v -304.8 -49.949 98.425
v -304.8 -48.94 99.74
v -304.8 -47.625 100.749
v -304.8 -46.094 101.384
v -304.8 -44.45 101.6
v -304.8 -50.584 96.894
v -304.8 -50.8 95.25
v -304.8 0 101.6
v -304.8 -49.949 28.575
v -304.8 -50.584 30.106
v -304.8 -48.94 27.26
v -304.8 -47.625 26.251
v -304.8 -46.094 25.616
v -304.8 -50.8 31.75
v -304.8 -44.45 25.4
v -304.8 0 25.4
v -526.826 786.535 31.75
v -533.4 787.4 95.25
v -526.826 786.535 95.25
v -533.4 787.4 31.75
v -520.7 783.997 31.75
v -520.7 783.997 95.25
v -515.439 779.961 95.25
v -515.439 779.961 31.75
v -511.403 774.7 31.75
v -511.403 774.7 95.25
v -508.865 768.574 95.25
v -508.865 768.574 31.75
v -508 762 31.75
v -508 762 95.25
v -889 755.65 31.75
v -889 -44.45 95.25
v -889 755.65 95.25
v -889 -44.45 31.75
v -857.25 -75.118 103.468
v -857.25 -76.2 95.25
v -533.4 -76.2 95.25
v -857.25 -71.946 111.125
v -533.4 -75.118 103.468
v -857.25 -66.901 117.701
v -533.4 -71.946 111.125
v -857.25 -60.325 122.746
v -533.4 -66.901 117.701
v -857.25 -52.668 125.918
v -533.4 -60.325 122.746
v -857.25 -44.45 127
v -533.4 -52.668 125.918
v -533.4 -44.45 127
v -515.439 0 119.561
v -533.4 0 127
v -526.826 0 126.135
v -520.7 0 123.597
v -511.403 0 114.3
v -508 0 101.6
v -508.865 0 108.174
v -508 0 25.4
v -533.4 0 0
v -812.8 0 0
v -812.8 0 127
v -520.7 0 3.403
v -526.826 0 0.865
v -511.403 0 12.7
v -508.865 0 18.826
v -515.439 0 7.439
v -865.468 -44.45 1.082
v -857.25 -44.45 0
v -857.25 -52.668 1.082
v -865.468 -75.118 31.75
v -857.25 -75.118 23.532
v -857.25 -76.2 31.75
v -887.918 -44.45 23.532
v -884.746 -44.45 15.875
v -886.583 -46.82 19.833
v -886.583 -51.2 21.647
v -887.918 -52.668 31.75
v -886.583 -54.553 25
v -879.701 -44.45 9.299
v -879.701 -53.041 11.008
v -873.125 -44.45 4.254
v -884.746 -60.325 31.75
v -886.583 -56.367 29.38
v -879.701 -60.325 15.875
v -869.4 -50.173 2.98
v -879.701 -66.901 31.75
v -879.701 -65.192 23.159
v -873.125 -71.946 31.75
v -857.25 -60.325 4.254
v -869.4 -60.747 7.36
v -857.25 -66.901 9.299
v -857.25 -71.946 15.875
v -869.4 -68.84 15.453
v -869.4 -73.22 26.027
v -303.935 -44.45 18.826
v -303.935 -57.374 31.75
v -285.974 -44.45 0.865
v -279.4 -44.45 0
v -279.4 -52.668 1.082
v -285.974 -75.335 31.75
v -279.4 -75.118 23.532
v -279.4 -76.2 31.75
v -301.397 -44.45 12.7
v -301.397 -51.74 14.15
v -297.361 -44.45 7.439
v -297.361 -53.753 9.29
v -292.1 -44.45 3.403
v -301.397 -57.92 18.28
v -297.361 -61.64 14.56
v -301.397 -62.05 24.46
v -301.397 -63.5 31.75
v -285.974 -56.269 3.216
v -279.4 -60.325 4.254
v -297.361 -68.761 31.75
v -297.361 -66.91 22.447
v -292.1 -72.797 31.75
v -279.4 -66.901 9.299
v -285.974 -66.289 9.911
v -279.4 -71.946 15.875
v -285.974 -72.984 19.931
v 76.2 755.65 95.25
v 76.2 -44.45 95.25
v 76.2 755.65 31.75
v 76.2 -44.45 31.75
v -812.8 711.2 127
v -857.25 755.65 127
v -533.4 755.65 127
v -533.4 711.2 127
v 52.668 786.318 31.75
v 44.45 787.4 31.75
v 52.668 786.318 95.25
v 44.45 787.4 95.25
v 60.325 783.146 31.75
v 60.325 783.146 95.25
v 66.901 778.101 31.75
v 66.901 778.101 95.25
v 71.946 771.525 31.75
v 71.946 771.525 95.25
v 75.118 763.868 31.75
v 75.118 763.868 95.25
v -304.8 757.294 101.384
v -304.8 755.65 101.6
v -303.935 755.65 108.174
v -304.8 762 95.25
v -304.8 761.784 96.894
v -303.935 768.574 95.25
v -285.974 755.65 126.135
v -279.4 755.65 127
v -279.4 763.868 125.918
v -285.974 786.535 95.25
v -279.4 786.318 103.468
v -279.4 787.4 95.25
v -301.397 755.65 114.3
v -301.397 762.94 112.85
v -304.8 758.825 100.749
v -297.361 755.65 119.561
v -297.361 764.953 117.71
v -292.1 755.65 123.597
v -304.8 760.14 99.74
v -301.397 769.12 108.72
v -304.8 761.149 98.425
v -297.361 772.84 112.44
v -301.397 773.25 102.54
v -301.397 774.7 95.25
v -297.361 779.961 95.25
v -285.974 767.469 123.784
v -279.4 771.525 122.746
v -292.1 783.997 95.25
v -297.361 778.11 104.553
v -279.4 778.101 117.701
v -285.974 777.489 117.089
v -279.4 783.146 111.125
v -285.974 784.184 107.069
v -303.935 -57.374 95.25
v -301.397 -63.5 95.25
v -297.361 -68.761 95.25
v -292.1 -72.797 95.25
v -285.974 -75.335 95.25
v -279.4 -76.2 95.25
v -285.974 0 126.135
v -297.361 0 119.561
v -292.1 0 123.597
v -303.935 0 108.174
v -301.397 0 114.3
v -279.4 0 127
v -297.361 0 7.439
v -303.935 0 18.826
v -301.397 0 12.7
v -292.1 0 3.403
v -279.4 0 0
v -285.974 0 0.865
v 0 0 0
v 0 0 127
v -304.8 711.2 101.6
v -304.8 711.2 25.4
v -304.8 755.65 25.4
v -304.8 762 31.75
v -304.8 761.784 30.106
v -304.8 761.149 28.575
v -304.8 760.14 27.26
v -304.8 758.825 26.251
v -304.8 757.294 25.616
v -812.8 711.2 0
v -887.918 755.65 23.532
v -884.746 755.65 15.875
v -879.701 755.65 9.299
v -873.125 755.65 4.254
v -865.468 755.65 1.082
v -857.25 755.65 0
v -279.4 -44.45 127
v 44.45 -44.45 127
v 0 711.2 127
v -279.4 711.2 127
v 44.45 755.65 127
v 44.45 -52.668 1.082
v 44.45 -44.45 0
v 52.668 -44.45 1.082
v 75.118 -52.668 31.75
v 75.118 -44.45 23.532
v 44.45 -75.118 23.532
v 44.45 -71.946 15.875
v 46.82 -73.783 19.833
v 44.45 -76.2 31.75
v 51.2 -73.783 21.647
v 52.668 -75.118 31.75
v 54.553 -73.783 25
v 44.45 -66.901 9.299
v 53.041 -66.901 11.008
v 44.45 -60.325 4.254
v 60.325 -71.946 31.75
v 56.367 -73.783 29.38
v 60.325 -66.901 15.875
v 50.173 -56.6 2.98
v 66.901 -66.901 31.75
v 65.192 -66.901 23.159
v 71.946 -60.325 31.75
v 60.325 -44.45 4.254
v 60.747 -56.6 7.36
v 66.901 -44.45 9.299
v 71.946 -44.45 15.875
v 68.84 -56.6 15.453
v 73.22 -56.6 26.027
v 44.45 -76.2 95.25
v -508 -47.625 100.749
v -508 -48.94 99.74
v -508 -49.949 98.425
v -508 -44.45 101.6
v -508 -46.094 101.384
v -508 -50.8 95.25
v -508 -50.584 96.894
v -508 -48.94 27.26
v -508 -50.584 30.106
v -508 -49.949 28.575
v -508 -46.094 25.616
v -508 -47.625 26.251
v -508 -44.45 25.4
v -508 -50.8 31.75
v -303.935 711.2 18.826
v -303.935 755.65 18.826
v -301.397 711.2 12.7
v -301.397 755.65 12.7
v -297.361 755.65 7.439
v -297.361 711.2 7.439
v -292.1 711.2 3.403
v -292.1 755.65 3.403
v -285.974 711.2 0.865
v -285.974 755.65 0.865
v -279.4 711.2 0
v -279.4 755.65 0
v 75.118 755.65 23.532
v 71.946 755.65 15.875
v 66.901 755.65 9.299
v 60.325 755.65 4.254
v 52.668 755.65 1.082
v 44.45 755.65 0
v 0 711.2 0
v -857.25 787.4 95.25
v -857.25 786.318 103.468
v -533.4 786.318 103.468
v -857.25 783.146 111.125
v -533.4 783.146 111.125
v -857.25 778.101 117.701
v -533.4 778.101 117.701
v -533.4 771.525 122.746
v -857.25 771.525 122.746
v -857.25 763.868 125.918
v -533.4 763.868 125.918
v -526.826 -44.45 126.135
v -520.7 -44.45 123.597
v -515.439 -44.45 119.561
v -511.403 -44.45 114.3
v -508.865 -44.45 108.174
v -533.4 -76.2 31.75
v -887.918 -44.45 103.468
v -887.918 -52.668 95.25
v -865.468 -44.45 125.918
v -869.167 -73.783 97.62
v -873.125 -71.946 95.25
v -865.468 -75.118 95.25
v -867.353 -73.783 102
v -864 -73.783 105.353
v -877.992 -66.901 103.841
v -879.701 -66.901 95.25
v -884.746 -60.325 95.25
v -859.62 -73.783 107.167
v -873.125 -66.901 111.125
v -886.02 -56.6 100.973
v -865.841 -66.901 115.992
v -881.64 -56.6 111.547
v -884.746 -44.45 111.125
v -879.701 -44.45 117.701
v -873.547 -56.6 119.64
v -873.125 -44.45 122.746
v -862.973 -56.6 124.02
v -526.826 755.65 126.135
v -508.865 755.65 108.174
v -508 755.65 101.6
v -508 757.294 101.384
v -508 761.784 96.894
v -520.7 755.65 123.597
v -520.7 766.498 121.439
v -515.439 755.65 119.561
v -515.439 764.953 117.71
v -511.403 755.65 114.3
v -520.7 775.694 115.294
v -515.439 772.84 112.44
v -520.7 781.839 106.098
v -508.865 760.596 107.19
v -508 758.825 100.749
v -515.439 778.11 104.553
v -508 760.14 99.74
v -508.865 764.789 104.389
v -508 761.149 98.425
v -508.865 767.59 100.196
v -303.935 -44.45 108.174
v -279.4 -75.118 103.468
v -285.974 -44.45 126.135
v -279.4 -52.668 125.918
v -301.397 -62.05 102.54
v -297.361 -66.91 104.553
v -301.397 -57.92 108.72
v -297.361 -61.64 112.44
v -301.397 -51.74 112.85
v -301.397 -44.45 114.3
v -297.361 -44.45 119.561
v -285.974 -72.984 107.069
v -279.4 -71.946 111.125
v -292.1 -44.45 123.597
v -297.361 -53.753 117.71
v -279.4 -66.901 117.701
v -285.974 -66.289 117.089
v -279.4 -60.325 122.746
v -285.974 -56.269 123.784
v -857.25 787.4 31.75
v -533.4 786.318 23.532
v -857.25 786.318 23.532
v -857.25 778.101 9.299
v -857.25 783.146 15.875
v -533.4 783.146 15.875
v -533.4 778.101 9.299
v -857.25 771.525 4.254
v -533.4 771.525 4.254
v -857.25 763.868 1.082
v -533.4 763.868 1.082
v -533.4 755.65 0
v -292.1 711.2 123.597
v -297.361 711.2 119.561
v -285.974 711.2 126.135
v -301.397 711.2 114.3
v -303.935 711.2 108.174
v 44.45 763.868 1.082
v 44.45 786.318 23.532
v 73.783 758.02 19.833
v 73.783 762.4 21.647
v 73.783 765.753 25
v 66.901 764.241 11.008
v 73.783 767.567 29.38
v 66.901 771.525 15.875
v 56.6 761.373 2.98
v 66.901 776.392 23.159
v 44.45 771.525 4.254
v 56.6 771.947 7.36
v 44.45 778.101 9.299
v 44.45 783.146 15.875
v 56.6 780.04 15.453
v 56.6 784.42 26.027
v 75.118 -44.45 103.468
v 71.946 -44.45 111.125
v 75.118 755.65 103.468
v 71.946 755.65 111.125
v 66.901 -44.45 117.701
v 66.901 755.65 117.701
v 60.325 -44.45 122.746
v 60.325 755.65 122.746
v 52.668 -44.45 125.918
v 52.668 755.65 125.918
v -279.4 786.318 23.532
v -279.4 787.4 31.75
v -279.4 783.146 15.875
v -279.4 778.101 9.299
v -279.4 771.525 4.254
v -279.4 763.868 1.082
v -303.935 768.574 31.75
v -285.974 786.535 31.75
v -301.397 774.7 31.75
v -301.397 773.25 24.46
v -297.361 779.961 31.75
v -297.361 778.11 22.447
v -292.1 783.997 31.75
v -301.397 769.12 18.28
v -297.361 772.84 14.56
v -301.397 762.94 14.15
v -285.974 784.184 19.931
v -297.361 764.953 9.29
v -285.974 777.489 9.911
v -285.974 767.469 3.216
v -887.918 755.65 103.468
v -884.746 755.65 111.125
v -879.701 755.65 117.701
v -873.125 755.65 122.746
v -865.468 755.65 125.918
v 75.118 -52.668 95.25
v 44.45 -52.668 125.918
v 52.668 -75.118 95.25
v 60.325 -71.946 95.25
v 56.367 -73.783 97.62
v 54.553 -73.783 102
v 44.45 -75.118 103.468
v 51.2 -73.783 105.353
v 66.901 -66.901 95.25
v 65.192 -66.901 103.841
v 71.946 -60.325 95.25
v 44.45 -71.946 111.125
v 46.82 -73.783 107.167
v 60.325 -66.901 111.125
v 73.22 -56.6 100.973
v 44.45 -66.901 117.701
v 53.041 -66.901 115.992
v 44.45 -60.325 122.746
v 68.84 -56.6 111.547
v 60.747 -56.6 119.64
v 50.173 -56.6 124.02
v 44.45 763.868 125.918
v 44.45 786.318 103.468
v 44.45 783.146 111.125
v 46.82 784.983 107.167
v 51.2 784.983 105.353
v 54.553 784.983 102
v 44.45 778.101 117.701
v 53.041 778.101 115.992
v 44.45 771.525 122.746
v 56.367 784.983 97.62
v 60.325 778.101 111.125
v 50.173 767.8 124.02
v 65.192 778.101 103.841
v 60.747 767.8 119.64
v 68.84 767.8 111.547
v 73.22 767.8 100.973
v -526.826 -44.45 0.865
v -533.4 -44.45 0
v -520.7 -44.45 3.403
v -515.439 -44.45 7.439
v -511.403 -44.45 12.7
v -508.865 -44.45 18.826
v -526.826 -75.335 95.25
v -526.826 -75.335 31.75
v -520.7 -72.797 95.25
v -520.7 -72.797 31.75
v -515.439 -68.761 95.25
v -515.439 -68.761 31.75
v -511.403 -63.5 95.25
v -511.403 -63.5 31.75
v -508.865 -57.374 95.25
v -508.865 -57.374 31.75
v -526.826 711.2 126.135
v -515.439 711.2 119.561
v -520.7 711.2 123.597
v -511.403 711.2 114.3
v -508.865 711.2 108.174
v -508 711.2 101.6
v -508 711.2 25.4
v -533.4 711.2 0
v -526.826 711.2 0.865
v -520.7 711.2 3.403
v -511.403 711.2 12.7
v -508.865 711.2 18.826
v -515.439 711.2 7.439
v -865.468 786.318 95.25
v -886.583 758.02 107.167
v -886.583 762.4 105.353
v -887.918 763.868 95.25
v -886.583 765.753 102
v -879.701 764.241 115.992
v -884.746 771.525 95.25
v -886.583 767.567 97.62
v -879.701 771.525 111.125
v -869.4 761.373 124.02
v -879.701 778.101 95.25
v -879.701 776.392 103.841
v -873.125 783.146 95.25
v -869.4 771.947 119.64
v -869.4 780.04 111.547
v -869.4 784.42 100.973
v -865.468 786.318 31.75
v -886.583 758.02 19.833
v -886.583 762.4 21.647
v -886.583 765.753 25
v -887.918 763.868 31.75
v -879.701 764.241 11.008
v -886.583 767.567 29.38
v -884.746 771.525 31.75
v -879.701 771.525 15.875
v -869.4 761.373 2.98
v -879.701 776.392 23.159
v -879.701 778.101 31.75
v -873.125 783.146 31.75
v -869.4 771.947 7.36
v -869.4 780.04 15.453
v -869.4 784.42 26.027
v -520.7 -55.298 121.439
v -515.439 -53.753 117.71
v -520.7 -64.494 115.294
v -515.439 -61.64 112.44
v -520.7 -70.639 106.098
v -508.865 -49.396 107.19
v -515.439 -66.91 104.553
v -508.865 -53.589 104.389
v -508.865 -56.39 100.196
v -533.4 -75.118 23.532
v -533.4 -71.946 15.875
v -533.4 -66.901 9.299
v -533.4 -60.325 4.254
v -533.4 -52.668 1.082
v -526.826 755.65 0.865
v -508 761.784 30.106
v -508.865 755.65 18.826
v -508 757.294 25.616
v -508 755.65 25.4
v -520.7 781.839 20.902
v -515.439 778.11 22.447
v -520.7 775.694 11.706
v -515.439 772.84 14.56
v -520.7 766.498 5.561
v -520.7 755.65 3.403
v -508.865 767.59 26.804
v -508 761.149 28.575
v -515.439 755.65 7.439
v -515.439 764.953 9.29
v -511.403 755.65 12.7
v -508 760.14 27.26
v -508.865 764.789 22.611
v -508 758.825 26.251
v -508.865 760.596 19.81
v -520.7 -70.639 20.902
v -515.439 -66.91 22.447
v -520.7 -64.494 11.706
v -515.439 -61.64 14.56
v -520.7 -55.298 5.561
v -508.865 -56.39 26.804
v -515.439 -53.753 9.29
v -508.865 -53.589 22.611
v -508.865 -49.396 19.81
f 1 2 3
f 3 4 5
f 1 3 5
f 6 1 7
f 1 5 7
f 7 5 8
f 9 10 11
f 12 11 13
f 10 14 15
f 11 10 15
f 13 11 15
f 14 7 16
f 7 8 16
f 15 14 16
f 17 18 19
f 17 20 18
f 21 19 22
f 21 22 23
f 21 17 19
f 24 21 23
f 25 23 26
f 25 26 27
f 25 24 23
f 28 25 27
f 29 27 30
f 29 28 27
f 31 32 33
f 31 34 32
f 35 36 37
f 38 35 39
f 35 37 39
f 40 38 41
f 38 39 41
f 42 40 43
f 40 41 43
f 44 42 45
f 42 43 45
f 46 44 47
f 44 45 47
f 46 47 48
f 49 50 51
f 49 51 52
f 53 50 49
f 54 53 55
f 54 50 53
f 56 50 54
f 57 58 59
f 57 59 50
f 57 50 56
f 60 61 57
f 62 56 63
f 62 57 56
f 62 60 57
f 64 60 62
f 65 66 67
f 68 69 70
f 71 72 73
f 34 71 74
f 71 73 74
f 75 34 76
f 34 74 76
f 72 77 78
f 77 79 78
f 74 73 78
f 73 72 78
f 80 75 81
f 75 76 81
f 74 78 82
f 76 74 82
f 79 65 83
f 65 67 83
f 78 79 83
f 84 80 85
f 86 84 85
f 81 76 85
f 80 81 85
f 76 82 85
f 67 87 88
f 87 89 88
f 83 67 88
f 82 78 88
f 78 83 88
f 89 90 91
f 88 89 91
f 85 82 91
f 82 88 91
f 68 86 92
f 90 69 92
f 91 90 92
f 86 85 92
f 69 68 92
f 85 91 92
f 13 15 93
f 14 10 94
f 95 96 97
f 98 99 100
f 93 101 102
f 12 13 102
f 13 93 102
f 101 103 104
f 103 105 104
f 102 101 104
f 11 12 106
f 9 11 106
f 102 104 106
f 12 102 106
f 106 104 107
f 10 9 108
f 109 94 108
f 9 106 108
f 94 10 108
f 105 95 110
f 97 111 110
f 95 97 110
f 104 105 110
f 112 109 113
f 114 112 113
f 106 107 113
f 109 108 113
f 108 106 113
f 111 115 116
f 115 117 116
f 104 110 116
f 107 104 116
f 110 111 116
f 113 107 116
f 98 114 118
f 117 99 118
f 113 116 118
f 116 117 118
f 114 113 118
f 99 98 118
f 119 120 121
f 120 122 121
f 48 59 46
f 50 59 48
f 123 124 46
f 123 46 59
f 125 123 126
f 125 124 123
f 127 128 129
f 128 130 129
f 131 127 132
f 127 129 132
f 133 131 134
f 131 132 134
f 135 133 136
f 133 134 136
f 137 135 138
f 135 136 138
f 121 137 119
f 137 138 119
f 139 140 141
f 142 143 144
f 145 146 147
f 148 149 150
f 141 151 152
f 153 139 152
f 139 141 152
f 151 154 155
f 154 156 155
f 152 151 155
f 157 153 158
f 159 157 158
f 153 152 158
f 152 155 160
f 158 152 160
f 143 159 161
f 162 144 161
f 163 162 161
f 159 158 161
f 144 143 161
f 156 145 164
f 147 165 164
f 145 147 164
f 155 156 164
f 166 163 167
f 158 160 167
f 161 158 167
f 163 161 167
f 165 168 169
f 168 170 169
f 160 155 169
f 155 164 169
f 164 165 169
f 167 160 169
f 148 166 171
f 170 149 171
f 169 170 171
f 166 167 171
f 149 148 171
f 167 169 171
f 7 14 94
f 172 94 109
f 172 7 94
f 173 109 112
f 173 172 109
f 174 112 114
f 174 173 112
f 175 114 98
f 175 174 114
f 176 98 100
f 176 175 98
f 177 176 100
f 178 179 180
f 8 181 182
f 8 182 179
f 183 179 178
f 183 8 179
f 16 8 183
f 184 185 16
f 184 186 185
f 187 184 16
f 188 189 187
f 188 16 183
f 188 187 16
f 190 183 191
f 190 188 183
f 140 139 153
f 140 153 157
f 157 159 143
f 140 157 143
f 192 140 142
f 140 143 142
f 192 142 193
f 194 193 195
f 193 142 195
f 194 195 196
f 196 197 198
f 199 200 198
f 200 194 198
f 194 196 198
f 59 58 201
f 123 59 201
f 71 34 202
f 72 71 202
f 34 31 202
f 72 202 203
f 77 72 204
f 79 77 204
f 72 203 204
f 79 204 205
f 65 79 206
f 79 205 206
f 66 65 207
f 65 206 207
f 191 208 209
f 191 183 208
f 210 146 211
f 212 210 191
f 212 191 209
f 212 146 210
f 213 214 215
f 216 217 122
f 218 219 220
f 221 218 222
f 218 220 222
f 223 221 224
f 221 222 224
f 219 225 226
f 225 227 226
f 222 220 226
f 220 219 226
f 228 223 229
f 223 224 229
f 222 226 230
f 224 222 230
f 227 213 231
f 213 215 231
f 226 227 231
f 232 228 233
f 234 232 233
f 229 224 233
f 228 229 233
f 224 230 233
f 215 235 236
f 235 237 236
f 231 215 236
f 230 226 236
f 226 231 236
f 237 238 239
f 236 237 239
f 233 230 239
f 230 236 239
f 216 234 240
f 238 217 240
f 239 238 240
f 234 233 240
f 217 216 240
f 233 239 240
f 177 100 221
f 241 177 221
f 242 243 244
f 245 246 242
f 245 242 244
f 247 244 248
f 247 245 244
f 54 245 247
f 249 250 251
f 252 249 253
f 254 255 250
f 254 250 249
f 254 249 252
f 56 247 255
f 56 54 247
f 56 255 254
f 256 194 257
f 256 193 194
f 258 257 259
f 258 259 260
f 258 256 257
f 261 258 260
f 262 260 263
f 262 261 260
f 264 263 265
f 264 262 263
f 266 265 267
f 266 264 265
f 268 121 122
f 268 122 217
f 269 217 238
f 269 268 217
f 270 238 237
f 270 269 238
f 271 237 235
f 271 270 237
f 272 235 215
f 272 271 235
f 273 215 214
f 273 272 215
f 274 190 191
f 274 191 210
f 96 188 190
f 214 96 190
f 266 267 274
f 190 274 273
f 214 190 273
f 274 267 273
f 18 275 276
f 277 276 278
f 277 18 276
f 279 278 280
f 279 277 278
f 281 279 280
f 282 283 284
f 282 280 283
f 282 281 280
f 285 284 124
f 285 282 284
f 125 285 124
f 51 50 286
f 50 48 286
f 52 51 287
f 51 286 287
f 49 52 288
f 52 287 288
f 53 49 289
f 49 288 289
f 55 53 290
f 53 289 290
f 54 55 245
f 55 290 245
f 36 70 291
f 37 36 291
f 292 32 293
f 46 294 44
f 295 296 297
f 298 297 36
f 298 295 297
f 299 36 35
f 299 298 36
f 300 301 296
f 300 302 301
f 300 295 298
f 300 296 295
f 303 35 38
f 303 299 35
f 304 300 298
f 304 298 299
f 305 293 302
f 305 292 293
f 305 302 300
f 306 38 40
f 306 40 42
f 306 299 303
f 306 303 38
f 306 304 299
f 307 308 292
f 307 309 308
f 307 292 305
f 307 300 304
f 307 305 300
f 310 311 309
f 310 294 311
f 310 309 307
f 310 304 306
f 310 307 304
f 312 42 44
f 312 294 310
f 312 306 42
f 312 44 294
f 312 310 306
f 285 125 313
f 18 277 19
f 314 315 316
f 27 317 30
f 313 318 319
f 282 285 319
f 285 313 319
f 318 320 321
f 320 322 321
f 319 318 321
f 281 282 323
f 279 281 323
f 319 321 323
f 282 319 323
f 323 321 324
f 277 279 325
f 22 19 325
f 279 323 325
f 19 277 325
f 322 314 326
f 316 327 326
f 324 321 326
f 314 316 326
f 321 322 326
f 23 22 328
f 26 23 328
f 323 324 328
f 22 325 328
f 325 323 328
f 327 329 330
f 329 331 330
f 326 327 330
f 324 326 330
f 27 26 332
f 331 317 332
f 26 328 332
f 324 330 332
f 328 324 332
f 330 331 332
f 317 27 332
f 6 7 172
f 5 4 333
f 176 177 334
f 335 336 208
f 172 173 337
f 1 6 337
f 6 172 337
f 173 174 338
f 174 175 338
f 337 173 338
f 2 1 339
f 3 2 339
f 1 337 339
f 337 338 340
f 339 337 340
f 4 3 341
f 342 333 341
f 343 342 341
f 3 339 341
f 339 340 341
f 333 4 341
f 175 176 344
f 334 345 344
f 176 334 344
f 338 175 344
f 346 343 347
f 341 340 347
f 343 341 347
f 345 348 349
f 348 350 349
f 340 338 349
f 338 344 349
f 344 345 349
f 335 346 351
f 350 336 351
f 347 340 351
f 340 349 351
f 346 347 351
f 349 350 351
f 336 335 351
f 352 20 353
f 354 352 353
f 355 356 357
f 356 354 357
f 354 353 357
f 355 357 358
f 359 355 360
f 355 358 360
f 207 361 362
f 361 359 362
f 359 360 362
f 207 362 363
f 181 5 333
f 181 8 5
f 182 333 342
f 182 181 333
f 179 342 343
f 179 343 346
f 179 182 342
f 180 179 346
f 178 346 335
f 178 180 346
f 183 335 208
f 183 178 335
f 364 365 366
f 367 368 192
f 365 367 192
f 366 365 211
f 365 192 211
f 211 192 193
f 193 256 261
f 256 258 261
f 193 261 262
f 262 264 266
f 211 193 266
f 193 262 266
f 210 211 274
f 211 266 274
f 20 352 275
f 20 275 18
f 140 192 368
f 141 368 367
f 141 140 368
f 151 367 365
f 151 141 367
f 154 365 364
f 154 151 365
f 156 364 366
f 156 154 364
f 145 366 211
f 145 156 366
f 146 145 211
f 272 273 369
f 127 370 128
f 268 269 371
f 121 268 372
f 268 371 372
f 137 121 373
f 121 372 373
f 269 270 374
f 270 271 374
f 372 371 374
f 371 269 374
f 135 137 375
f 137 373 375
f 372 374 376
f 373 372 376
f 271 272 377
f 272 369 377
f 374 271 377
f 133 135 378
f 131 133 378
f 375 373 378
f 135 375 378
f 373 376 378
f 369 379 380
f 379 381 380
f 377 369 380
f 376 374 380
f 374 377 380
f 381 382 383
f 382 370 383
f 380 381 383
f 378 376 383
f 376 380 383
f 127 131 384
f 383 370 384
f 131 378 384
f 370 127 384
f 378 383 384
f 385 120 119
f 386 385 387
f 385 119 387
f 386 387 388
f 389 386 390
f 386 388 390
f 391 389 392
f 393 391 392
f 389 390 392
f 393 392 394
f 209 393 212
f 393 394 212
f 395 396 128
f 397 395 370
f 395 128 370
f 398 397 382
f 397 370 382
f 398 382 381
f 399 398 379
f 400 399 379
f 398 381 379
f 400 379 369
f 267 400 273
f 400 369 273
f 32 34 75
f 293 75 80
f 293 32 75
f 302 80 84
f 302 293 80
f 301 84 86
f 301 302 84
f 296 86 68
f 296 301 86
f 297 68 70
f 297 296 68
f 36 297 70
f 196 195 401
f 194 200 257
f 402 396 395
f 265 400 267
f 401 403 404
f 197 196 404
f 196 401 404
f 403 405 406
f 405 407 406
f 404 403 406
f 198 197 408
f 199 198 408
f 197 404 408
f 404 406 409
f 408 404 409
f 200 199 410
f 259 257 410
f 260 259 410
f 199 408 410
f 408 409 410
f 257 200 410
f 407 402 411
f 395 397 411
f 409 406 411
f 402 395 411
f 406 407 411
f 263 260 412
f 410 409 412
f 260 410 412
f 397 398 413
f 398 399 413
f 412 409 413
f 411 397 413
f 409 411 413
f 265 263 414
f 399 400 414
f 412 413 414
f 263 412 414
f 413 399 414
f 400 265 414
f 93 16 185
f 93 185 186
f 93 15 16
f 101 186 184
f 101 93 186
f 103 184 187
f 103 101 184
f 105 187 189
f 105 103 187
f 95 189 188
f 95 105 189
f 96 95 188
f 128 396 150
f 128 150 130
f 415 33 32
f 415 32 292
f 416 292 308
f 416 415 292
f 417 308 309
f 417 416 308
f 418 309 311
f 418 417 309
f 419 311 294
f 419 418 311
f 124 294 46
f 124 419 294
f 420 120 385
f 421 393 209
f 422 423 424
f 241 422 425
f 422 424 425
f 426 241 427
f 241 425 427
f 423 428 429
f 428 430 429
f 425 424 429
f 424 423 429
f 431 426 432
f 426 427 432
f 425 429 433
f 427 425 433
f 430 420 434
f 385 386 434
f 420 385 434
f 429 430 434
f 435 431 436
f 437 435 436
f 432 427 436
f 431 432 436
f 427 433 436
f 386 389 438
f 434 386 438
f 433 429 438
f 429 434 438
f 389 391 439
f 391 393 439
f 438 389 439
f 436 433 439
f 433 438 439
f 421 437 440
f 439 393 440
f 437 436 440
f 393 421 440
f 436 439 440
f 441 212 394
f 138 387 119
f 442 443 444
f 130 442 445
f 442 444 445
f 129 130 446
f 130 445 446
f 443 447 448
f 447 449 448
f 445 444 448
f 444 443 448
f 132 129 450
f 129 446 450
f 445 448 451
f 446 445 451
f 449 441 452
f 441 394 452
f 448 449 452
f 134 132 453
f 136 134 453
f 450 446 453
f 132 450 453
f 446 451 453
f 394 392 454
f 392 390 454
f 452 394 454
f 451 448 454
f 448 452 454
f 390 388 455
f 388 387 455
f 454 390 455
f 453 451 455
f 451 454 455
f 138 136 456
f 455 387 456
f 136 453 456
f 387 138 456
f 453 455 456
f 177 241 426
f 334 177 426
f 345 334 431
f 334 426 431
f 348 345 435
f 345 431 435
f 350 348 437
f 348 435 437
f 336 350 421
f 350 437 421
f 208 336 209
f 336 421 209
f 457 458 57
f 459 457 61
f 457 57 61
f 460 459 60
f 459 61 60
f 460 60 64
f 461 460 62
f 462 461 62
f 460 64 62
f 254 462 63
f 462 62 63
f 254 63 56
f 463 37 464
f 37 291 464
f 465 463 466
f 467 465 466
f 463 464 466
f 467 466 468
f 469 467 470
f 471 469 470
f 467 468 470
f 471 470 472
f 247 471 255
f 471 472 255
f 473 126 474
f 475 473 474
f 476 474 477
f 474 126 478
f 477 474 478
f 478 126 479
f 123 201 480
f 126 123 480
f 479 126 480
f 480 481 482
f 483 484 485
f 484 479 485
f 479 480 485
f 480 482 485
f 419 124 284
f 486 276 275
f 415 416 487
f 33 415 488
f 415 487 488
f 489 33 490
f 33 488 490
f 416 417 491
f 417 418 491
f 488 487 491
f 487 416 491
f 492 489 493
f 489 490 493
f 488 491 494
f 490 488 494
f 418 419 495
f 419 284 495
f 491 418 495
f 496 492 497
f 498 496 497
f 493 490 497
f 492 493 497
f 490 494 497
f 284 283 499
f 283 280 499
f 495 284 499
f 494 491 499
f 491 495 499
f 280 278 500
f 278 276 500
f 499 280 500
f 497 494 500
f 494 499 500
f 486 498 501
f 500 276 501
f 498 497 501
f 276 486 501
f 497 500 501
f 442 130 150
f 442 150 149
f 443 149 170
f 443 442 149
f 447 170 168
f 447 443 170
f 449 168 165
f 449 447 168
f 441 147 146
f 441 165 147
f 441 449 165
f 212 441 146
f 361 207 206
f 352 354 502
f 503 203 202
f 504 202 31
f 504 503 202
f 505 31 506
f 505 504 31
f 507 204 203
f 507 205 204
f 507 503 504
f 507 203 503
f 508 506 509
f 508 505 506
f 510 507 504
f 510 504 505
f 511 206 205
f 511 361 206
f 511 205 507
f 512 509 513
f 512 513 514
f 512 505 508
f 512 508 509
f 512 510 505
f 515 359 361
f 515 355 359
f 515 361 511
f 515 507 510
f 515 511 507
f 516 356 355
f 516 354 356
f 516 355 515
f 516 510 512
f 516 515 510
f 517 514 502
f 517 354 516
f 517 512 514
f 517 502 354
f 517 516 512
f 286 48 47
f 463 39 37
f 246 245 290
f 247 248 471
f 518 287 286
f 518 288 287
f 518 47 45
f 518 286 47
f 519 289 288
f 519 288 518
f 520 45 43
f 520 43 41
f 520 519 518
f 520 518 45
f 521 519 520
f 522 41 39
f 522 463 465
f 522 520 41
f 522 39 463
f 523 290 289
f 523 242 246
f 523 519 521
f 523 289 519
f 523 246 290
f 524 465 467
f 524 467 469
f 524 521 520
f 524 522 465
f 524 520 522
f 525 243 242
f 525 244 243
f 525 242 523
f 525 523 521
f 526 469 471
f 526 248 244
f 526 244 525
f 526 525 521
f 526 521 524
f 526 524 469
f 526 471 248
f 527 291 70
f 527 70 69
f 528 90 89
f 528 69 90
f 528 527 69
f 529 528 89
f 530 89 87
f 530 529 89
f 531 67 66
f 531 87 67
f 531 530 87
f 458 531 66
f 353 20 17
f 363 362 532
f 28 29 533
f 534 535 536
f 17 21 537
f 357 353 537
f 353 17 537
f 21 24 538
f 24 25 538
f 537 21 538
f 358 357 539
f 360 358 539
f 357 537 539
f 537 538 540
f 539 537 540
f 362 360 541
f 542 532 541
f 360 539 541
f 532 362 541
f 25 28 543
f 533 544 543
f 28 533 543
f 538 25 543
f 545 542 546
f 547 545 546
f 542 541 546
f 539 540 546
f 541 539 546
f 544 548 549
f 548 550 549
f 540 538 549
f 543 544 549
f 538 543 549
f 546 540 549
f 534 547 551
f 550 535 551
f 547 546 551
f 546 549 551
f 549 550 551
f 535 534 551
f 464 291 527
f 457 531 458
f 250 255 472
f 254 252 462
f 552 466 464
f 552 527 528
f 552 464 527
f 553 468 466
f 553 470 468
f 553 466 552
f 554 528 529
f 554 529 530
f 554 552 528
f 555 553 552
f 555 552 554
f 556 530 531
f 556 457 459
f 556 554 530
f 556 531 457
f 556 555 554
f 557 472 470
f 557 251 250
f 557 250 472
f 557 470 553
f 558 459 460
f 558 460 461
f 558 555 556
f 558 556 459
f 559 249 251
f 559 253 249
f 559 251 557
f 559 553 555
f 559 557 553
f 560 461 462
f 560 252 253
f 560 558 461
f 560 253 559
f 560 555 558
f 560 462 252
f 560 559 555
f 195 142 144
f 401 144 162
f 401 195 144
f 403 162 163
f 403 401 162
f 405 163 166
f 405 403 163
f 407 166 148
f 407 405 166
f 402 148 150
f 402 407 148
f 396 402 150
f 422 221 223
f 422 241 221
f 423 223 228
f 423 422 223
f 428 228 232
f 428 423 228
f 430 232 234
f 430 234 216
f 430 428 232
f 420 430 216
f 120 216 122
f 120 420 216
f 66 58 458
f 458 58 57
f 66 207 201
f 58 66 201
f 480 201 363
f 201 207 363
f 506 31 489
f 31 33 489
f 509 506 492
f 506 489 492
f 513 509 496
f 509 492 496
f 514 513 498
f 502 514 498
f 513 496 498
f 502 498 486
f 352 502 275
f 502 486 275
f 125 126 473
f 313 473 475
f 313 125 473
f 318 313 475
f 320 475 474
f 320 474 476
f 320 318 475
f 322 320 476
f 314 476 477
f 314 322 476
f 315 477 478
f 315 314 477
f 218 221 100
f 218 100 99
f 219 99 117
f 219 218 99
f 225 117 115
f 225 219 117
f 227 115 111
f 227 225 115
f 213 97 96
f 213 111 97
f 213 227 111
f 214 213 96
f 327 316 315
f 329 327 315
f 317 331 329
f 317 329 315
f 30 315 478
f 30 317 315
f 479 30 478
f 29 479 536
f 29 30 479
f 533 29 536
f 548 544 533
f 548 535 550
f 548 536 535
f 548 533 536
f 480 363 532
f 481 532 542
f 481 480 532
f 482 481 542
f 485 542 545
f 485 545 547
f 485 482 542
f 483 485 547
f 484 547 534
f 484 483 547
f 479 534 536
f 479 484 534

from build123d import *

# Parameters (mm, degrees)
SKETCH1_W           = 965.2
SKETCH1_H           = 863.6
SKETCH1_W_2         = 812.8
SKETCH1_H_2         = 711.2
BOSS_EXTRUDE1_DEPTH = 127
FILLET1_R           = 31.75
CUT_EXTRUDE1_REACH  = 1247.895
SKETCH2_W           = 203.2
SKETCH2_H           = 127
FILLET2_R           = 25.4
FILLET3_R           = 25.4


with BuildPart() as part:
    # Sketch1 → Boss-Extrude1 (new body)
    with BuildSketch(Plane.XY):
        with Locations((-406.4, 355.6)):
            Rectangle(SKETCH1_W, SKETCH1_H)
        with Locations((-406.4, 355.6)):
            Rectangle(SKETCH1_W_2, SKETCH1_H_2, mode=Mode.SUBTRACT)
    extrude(amount=BOSS_EXTRUDE1_DEPTH)

    # Fillet1
    fillet1_edges = [part.edges().sort_by_distance(p)[0] for p in [
        (76.2, 355.6, 127),
        (-406.4, 787.4, 127),
        (-889, 355.6, 127),
        (-406.4, 787.4, 0),
        (76.2, 355.6, 0),
        (-406.4, -76.2, 0),
        (-889, 355.6, 0),
        (-889, 787.4, 63.5),
        (76.2, 787.4, 63.5),
        (76.2, -76.2, 63.5),
        (-889, -76.2, 63.5),
        (-406.4, -76.2, 127),
    ]]
    fillet(fillet1_edges, radius=FILLET1_R)

    # Cut-Extrude1: up to this face of the body (flat: up to its plane)
    cut_extrude1_end = Plane(part.part.faces().sort_by_distance((-406.4, -76.2, 63.5))[0])
    # Sketch2 → Cut-Extrude1 (cut, up to the picked face)
    with BuildSketch(Plane(origin=(0, 787.4, 0), x_dir=(1, 0, 0), z_dir=(0, 1, 0)), mode=Mode.PRIVATE) as cut_extrude1_sk1:
        with Locations((-406.4, -63.5)):
            Rectangle(SKETCH2_W, SKETCH2_H)
    cut_extrude1_tool1 = split(extrude(cut_extrude1_sk1.sketch, amount=-CUT_EXTRUDE1_REACH, mode=Mode.PRIVATE), bisect_by=cut_extrude1_end, keep=Keep.BOTH, mode=Mode.PRIVATE)
    add(cut_extrude1_tool1.solids().sort_by(Axis((-406.4, 787.4, 63.5), (0, -1, 0)))[0], mode=Mode.SUBTRACT)


with BuildPart() as cut_extrude1_piece_1:
    # of the separate pieces the step leaves, piece 1, a body of its own (cut_extrude1_pieces)
    add(part.part.solids().sort_by_distance((-857.25, 787.4, 31.75))[0])

    # Fillet3
    fillet3_edges = [cut_extrude1_piece_1.edges().sort_by_distance(p)[0] for p in [
        (-508, -66.900640303, 117.700640303),
        (-508, 733.425, 0),
        (-508, -22.225, 0),
        (-508, 787.4, 63.5),
        (-508, 733.425, 127),
        (-508, 778.100640303, 9.299359697),
        (-508, -66.900640303, 9.299359697),
        (-508, 778.100640303, 117.700640303),
        (-508, -76.2, 63.5),
        (-508, -22.225, 127),
    ]]
    fillet(fillet3_edges, radius=FILLET3_R)


with BuildPart() as cut_extrude1_piece_2:
    # of the separate pieces the step leaves, piece 2, a body of its own (cut_extrude1_pieces)
    add(part.part.solids().sort_by_distance((-304.8, 787.4, 95.25))[0])

    # Fillet2
    fillet2_edges = [cut_extrude1_piece_2.edges().sort_by_distance(p)[0] for p in [
        (-304.8, -22.225, 0),
        (-304.8, 733.425, 0),
        (-304.8, -66.900640303, 9.299359697),
        (-304.8, -76.2, 63.5),
        (-304.8, -66.900640303, 117.700640303),
        (-304.8, -22.225, 127),
        (-304.8, 733.425, 127),
        (-304.8, 778.100640303, 117.700640303),
        (-304.8, 787.4, 63.5),
        (-304.8, 778.100640303, 9.299359697),
    ]]
    fillet(fillet2_edges, radius=FILLET2_R)


solid = Compound([cut_extrude1_piece_1.part, cut_extrude1_piece_2.part])
